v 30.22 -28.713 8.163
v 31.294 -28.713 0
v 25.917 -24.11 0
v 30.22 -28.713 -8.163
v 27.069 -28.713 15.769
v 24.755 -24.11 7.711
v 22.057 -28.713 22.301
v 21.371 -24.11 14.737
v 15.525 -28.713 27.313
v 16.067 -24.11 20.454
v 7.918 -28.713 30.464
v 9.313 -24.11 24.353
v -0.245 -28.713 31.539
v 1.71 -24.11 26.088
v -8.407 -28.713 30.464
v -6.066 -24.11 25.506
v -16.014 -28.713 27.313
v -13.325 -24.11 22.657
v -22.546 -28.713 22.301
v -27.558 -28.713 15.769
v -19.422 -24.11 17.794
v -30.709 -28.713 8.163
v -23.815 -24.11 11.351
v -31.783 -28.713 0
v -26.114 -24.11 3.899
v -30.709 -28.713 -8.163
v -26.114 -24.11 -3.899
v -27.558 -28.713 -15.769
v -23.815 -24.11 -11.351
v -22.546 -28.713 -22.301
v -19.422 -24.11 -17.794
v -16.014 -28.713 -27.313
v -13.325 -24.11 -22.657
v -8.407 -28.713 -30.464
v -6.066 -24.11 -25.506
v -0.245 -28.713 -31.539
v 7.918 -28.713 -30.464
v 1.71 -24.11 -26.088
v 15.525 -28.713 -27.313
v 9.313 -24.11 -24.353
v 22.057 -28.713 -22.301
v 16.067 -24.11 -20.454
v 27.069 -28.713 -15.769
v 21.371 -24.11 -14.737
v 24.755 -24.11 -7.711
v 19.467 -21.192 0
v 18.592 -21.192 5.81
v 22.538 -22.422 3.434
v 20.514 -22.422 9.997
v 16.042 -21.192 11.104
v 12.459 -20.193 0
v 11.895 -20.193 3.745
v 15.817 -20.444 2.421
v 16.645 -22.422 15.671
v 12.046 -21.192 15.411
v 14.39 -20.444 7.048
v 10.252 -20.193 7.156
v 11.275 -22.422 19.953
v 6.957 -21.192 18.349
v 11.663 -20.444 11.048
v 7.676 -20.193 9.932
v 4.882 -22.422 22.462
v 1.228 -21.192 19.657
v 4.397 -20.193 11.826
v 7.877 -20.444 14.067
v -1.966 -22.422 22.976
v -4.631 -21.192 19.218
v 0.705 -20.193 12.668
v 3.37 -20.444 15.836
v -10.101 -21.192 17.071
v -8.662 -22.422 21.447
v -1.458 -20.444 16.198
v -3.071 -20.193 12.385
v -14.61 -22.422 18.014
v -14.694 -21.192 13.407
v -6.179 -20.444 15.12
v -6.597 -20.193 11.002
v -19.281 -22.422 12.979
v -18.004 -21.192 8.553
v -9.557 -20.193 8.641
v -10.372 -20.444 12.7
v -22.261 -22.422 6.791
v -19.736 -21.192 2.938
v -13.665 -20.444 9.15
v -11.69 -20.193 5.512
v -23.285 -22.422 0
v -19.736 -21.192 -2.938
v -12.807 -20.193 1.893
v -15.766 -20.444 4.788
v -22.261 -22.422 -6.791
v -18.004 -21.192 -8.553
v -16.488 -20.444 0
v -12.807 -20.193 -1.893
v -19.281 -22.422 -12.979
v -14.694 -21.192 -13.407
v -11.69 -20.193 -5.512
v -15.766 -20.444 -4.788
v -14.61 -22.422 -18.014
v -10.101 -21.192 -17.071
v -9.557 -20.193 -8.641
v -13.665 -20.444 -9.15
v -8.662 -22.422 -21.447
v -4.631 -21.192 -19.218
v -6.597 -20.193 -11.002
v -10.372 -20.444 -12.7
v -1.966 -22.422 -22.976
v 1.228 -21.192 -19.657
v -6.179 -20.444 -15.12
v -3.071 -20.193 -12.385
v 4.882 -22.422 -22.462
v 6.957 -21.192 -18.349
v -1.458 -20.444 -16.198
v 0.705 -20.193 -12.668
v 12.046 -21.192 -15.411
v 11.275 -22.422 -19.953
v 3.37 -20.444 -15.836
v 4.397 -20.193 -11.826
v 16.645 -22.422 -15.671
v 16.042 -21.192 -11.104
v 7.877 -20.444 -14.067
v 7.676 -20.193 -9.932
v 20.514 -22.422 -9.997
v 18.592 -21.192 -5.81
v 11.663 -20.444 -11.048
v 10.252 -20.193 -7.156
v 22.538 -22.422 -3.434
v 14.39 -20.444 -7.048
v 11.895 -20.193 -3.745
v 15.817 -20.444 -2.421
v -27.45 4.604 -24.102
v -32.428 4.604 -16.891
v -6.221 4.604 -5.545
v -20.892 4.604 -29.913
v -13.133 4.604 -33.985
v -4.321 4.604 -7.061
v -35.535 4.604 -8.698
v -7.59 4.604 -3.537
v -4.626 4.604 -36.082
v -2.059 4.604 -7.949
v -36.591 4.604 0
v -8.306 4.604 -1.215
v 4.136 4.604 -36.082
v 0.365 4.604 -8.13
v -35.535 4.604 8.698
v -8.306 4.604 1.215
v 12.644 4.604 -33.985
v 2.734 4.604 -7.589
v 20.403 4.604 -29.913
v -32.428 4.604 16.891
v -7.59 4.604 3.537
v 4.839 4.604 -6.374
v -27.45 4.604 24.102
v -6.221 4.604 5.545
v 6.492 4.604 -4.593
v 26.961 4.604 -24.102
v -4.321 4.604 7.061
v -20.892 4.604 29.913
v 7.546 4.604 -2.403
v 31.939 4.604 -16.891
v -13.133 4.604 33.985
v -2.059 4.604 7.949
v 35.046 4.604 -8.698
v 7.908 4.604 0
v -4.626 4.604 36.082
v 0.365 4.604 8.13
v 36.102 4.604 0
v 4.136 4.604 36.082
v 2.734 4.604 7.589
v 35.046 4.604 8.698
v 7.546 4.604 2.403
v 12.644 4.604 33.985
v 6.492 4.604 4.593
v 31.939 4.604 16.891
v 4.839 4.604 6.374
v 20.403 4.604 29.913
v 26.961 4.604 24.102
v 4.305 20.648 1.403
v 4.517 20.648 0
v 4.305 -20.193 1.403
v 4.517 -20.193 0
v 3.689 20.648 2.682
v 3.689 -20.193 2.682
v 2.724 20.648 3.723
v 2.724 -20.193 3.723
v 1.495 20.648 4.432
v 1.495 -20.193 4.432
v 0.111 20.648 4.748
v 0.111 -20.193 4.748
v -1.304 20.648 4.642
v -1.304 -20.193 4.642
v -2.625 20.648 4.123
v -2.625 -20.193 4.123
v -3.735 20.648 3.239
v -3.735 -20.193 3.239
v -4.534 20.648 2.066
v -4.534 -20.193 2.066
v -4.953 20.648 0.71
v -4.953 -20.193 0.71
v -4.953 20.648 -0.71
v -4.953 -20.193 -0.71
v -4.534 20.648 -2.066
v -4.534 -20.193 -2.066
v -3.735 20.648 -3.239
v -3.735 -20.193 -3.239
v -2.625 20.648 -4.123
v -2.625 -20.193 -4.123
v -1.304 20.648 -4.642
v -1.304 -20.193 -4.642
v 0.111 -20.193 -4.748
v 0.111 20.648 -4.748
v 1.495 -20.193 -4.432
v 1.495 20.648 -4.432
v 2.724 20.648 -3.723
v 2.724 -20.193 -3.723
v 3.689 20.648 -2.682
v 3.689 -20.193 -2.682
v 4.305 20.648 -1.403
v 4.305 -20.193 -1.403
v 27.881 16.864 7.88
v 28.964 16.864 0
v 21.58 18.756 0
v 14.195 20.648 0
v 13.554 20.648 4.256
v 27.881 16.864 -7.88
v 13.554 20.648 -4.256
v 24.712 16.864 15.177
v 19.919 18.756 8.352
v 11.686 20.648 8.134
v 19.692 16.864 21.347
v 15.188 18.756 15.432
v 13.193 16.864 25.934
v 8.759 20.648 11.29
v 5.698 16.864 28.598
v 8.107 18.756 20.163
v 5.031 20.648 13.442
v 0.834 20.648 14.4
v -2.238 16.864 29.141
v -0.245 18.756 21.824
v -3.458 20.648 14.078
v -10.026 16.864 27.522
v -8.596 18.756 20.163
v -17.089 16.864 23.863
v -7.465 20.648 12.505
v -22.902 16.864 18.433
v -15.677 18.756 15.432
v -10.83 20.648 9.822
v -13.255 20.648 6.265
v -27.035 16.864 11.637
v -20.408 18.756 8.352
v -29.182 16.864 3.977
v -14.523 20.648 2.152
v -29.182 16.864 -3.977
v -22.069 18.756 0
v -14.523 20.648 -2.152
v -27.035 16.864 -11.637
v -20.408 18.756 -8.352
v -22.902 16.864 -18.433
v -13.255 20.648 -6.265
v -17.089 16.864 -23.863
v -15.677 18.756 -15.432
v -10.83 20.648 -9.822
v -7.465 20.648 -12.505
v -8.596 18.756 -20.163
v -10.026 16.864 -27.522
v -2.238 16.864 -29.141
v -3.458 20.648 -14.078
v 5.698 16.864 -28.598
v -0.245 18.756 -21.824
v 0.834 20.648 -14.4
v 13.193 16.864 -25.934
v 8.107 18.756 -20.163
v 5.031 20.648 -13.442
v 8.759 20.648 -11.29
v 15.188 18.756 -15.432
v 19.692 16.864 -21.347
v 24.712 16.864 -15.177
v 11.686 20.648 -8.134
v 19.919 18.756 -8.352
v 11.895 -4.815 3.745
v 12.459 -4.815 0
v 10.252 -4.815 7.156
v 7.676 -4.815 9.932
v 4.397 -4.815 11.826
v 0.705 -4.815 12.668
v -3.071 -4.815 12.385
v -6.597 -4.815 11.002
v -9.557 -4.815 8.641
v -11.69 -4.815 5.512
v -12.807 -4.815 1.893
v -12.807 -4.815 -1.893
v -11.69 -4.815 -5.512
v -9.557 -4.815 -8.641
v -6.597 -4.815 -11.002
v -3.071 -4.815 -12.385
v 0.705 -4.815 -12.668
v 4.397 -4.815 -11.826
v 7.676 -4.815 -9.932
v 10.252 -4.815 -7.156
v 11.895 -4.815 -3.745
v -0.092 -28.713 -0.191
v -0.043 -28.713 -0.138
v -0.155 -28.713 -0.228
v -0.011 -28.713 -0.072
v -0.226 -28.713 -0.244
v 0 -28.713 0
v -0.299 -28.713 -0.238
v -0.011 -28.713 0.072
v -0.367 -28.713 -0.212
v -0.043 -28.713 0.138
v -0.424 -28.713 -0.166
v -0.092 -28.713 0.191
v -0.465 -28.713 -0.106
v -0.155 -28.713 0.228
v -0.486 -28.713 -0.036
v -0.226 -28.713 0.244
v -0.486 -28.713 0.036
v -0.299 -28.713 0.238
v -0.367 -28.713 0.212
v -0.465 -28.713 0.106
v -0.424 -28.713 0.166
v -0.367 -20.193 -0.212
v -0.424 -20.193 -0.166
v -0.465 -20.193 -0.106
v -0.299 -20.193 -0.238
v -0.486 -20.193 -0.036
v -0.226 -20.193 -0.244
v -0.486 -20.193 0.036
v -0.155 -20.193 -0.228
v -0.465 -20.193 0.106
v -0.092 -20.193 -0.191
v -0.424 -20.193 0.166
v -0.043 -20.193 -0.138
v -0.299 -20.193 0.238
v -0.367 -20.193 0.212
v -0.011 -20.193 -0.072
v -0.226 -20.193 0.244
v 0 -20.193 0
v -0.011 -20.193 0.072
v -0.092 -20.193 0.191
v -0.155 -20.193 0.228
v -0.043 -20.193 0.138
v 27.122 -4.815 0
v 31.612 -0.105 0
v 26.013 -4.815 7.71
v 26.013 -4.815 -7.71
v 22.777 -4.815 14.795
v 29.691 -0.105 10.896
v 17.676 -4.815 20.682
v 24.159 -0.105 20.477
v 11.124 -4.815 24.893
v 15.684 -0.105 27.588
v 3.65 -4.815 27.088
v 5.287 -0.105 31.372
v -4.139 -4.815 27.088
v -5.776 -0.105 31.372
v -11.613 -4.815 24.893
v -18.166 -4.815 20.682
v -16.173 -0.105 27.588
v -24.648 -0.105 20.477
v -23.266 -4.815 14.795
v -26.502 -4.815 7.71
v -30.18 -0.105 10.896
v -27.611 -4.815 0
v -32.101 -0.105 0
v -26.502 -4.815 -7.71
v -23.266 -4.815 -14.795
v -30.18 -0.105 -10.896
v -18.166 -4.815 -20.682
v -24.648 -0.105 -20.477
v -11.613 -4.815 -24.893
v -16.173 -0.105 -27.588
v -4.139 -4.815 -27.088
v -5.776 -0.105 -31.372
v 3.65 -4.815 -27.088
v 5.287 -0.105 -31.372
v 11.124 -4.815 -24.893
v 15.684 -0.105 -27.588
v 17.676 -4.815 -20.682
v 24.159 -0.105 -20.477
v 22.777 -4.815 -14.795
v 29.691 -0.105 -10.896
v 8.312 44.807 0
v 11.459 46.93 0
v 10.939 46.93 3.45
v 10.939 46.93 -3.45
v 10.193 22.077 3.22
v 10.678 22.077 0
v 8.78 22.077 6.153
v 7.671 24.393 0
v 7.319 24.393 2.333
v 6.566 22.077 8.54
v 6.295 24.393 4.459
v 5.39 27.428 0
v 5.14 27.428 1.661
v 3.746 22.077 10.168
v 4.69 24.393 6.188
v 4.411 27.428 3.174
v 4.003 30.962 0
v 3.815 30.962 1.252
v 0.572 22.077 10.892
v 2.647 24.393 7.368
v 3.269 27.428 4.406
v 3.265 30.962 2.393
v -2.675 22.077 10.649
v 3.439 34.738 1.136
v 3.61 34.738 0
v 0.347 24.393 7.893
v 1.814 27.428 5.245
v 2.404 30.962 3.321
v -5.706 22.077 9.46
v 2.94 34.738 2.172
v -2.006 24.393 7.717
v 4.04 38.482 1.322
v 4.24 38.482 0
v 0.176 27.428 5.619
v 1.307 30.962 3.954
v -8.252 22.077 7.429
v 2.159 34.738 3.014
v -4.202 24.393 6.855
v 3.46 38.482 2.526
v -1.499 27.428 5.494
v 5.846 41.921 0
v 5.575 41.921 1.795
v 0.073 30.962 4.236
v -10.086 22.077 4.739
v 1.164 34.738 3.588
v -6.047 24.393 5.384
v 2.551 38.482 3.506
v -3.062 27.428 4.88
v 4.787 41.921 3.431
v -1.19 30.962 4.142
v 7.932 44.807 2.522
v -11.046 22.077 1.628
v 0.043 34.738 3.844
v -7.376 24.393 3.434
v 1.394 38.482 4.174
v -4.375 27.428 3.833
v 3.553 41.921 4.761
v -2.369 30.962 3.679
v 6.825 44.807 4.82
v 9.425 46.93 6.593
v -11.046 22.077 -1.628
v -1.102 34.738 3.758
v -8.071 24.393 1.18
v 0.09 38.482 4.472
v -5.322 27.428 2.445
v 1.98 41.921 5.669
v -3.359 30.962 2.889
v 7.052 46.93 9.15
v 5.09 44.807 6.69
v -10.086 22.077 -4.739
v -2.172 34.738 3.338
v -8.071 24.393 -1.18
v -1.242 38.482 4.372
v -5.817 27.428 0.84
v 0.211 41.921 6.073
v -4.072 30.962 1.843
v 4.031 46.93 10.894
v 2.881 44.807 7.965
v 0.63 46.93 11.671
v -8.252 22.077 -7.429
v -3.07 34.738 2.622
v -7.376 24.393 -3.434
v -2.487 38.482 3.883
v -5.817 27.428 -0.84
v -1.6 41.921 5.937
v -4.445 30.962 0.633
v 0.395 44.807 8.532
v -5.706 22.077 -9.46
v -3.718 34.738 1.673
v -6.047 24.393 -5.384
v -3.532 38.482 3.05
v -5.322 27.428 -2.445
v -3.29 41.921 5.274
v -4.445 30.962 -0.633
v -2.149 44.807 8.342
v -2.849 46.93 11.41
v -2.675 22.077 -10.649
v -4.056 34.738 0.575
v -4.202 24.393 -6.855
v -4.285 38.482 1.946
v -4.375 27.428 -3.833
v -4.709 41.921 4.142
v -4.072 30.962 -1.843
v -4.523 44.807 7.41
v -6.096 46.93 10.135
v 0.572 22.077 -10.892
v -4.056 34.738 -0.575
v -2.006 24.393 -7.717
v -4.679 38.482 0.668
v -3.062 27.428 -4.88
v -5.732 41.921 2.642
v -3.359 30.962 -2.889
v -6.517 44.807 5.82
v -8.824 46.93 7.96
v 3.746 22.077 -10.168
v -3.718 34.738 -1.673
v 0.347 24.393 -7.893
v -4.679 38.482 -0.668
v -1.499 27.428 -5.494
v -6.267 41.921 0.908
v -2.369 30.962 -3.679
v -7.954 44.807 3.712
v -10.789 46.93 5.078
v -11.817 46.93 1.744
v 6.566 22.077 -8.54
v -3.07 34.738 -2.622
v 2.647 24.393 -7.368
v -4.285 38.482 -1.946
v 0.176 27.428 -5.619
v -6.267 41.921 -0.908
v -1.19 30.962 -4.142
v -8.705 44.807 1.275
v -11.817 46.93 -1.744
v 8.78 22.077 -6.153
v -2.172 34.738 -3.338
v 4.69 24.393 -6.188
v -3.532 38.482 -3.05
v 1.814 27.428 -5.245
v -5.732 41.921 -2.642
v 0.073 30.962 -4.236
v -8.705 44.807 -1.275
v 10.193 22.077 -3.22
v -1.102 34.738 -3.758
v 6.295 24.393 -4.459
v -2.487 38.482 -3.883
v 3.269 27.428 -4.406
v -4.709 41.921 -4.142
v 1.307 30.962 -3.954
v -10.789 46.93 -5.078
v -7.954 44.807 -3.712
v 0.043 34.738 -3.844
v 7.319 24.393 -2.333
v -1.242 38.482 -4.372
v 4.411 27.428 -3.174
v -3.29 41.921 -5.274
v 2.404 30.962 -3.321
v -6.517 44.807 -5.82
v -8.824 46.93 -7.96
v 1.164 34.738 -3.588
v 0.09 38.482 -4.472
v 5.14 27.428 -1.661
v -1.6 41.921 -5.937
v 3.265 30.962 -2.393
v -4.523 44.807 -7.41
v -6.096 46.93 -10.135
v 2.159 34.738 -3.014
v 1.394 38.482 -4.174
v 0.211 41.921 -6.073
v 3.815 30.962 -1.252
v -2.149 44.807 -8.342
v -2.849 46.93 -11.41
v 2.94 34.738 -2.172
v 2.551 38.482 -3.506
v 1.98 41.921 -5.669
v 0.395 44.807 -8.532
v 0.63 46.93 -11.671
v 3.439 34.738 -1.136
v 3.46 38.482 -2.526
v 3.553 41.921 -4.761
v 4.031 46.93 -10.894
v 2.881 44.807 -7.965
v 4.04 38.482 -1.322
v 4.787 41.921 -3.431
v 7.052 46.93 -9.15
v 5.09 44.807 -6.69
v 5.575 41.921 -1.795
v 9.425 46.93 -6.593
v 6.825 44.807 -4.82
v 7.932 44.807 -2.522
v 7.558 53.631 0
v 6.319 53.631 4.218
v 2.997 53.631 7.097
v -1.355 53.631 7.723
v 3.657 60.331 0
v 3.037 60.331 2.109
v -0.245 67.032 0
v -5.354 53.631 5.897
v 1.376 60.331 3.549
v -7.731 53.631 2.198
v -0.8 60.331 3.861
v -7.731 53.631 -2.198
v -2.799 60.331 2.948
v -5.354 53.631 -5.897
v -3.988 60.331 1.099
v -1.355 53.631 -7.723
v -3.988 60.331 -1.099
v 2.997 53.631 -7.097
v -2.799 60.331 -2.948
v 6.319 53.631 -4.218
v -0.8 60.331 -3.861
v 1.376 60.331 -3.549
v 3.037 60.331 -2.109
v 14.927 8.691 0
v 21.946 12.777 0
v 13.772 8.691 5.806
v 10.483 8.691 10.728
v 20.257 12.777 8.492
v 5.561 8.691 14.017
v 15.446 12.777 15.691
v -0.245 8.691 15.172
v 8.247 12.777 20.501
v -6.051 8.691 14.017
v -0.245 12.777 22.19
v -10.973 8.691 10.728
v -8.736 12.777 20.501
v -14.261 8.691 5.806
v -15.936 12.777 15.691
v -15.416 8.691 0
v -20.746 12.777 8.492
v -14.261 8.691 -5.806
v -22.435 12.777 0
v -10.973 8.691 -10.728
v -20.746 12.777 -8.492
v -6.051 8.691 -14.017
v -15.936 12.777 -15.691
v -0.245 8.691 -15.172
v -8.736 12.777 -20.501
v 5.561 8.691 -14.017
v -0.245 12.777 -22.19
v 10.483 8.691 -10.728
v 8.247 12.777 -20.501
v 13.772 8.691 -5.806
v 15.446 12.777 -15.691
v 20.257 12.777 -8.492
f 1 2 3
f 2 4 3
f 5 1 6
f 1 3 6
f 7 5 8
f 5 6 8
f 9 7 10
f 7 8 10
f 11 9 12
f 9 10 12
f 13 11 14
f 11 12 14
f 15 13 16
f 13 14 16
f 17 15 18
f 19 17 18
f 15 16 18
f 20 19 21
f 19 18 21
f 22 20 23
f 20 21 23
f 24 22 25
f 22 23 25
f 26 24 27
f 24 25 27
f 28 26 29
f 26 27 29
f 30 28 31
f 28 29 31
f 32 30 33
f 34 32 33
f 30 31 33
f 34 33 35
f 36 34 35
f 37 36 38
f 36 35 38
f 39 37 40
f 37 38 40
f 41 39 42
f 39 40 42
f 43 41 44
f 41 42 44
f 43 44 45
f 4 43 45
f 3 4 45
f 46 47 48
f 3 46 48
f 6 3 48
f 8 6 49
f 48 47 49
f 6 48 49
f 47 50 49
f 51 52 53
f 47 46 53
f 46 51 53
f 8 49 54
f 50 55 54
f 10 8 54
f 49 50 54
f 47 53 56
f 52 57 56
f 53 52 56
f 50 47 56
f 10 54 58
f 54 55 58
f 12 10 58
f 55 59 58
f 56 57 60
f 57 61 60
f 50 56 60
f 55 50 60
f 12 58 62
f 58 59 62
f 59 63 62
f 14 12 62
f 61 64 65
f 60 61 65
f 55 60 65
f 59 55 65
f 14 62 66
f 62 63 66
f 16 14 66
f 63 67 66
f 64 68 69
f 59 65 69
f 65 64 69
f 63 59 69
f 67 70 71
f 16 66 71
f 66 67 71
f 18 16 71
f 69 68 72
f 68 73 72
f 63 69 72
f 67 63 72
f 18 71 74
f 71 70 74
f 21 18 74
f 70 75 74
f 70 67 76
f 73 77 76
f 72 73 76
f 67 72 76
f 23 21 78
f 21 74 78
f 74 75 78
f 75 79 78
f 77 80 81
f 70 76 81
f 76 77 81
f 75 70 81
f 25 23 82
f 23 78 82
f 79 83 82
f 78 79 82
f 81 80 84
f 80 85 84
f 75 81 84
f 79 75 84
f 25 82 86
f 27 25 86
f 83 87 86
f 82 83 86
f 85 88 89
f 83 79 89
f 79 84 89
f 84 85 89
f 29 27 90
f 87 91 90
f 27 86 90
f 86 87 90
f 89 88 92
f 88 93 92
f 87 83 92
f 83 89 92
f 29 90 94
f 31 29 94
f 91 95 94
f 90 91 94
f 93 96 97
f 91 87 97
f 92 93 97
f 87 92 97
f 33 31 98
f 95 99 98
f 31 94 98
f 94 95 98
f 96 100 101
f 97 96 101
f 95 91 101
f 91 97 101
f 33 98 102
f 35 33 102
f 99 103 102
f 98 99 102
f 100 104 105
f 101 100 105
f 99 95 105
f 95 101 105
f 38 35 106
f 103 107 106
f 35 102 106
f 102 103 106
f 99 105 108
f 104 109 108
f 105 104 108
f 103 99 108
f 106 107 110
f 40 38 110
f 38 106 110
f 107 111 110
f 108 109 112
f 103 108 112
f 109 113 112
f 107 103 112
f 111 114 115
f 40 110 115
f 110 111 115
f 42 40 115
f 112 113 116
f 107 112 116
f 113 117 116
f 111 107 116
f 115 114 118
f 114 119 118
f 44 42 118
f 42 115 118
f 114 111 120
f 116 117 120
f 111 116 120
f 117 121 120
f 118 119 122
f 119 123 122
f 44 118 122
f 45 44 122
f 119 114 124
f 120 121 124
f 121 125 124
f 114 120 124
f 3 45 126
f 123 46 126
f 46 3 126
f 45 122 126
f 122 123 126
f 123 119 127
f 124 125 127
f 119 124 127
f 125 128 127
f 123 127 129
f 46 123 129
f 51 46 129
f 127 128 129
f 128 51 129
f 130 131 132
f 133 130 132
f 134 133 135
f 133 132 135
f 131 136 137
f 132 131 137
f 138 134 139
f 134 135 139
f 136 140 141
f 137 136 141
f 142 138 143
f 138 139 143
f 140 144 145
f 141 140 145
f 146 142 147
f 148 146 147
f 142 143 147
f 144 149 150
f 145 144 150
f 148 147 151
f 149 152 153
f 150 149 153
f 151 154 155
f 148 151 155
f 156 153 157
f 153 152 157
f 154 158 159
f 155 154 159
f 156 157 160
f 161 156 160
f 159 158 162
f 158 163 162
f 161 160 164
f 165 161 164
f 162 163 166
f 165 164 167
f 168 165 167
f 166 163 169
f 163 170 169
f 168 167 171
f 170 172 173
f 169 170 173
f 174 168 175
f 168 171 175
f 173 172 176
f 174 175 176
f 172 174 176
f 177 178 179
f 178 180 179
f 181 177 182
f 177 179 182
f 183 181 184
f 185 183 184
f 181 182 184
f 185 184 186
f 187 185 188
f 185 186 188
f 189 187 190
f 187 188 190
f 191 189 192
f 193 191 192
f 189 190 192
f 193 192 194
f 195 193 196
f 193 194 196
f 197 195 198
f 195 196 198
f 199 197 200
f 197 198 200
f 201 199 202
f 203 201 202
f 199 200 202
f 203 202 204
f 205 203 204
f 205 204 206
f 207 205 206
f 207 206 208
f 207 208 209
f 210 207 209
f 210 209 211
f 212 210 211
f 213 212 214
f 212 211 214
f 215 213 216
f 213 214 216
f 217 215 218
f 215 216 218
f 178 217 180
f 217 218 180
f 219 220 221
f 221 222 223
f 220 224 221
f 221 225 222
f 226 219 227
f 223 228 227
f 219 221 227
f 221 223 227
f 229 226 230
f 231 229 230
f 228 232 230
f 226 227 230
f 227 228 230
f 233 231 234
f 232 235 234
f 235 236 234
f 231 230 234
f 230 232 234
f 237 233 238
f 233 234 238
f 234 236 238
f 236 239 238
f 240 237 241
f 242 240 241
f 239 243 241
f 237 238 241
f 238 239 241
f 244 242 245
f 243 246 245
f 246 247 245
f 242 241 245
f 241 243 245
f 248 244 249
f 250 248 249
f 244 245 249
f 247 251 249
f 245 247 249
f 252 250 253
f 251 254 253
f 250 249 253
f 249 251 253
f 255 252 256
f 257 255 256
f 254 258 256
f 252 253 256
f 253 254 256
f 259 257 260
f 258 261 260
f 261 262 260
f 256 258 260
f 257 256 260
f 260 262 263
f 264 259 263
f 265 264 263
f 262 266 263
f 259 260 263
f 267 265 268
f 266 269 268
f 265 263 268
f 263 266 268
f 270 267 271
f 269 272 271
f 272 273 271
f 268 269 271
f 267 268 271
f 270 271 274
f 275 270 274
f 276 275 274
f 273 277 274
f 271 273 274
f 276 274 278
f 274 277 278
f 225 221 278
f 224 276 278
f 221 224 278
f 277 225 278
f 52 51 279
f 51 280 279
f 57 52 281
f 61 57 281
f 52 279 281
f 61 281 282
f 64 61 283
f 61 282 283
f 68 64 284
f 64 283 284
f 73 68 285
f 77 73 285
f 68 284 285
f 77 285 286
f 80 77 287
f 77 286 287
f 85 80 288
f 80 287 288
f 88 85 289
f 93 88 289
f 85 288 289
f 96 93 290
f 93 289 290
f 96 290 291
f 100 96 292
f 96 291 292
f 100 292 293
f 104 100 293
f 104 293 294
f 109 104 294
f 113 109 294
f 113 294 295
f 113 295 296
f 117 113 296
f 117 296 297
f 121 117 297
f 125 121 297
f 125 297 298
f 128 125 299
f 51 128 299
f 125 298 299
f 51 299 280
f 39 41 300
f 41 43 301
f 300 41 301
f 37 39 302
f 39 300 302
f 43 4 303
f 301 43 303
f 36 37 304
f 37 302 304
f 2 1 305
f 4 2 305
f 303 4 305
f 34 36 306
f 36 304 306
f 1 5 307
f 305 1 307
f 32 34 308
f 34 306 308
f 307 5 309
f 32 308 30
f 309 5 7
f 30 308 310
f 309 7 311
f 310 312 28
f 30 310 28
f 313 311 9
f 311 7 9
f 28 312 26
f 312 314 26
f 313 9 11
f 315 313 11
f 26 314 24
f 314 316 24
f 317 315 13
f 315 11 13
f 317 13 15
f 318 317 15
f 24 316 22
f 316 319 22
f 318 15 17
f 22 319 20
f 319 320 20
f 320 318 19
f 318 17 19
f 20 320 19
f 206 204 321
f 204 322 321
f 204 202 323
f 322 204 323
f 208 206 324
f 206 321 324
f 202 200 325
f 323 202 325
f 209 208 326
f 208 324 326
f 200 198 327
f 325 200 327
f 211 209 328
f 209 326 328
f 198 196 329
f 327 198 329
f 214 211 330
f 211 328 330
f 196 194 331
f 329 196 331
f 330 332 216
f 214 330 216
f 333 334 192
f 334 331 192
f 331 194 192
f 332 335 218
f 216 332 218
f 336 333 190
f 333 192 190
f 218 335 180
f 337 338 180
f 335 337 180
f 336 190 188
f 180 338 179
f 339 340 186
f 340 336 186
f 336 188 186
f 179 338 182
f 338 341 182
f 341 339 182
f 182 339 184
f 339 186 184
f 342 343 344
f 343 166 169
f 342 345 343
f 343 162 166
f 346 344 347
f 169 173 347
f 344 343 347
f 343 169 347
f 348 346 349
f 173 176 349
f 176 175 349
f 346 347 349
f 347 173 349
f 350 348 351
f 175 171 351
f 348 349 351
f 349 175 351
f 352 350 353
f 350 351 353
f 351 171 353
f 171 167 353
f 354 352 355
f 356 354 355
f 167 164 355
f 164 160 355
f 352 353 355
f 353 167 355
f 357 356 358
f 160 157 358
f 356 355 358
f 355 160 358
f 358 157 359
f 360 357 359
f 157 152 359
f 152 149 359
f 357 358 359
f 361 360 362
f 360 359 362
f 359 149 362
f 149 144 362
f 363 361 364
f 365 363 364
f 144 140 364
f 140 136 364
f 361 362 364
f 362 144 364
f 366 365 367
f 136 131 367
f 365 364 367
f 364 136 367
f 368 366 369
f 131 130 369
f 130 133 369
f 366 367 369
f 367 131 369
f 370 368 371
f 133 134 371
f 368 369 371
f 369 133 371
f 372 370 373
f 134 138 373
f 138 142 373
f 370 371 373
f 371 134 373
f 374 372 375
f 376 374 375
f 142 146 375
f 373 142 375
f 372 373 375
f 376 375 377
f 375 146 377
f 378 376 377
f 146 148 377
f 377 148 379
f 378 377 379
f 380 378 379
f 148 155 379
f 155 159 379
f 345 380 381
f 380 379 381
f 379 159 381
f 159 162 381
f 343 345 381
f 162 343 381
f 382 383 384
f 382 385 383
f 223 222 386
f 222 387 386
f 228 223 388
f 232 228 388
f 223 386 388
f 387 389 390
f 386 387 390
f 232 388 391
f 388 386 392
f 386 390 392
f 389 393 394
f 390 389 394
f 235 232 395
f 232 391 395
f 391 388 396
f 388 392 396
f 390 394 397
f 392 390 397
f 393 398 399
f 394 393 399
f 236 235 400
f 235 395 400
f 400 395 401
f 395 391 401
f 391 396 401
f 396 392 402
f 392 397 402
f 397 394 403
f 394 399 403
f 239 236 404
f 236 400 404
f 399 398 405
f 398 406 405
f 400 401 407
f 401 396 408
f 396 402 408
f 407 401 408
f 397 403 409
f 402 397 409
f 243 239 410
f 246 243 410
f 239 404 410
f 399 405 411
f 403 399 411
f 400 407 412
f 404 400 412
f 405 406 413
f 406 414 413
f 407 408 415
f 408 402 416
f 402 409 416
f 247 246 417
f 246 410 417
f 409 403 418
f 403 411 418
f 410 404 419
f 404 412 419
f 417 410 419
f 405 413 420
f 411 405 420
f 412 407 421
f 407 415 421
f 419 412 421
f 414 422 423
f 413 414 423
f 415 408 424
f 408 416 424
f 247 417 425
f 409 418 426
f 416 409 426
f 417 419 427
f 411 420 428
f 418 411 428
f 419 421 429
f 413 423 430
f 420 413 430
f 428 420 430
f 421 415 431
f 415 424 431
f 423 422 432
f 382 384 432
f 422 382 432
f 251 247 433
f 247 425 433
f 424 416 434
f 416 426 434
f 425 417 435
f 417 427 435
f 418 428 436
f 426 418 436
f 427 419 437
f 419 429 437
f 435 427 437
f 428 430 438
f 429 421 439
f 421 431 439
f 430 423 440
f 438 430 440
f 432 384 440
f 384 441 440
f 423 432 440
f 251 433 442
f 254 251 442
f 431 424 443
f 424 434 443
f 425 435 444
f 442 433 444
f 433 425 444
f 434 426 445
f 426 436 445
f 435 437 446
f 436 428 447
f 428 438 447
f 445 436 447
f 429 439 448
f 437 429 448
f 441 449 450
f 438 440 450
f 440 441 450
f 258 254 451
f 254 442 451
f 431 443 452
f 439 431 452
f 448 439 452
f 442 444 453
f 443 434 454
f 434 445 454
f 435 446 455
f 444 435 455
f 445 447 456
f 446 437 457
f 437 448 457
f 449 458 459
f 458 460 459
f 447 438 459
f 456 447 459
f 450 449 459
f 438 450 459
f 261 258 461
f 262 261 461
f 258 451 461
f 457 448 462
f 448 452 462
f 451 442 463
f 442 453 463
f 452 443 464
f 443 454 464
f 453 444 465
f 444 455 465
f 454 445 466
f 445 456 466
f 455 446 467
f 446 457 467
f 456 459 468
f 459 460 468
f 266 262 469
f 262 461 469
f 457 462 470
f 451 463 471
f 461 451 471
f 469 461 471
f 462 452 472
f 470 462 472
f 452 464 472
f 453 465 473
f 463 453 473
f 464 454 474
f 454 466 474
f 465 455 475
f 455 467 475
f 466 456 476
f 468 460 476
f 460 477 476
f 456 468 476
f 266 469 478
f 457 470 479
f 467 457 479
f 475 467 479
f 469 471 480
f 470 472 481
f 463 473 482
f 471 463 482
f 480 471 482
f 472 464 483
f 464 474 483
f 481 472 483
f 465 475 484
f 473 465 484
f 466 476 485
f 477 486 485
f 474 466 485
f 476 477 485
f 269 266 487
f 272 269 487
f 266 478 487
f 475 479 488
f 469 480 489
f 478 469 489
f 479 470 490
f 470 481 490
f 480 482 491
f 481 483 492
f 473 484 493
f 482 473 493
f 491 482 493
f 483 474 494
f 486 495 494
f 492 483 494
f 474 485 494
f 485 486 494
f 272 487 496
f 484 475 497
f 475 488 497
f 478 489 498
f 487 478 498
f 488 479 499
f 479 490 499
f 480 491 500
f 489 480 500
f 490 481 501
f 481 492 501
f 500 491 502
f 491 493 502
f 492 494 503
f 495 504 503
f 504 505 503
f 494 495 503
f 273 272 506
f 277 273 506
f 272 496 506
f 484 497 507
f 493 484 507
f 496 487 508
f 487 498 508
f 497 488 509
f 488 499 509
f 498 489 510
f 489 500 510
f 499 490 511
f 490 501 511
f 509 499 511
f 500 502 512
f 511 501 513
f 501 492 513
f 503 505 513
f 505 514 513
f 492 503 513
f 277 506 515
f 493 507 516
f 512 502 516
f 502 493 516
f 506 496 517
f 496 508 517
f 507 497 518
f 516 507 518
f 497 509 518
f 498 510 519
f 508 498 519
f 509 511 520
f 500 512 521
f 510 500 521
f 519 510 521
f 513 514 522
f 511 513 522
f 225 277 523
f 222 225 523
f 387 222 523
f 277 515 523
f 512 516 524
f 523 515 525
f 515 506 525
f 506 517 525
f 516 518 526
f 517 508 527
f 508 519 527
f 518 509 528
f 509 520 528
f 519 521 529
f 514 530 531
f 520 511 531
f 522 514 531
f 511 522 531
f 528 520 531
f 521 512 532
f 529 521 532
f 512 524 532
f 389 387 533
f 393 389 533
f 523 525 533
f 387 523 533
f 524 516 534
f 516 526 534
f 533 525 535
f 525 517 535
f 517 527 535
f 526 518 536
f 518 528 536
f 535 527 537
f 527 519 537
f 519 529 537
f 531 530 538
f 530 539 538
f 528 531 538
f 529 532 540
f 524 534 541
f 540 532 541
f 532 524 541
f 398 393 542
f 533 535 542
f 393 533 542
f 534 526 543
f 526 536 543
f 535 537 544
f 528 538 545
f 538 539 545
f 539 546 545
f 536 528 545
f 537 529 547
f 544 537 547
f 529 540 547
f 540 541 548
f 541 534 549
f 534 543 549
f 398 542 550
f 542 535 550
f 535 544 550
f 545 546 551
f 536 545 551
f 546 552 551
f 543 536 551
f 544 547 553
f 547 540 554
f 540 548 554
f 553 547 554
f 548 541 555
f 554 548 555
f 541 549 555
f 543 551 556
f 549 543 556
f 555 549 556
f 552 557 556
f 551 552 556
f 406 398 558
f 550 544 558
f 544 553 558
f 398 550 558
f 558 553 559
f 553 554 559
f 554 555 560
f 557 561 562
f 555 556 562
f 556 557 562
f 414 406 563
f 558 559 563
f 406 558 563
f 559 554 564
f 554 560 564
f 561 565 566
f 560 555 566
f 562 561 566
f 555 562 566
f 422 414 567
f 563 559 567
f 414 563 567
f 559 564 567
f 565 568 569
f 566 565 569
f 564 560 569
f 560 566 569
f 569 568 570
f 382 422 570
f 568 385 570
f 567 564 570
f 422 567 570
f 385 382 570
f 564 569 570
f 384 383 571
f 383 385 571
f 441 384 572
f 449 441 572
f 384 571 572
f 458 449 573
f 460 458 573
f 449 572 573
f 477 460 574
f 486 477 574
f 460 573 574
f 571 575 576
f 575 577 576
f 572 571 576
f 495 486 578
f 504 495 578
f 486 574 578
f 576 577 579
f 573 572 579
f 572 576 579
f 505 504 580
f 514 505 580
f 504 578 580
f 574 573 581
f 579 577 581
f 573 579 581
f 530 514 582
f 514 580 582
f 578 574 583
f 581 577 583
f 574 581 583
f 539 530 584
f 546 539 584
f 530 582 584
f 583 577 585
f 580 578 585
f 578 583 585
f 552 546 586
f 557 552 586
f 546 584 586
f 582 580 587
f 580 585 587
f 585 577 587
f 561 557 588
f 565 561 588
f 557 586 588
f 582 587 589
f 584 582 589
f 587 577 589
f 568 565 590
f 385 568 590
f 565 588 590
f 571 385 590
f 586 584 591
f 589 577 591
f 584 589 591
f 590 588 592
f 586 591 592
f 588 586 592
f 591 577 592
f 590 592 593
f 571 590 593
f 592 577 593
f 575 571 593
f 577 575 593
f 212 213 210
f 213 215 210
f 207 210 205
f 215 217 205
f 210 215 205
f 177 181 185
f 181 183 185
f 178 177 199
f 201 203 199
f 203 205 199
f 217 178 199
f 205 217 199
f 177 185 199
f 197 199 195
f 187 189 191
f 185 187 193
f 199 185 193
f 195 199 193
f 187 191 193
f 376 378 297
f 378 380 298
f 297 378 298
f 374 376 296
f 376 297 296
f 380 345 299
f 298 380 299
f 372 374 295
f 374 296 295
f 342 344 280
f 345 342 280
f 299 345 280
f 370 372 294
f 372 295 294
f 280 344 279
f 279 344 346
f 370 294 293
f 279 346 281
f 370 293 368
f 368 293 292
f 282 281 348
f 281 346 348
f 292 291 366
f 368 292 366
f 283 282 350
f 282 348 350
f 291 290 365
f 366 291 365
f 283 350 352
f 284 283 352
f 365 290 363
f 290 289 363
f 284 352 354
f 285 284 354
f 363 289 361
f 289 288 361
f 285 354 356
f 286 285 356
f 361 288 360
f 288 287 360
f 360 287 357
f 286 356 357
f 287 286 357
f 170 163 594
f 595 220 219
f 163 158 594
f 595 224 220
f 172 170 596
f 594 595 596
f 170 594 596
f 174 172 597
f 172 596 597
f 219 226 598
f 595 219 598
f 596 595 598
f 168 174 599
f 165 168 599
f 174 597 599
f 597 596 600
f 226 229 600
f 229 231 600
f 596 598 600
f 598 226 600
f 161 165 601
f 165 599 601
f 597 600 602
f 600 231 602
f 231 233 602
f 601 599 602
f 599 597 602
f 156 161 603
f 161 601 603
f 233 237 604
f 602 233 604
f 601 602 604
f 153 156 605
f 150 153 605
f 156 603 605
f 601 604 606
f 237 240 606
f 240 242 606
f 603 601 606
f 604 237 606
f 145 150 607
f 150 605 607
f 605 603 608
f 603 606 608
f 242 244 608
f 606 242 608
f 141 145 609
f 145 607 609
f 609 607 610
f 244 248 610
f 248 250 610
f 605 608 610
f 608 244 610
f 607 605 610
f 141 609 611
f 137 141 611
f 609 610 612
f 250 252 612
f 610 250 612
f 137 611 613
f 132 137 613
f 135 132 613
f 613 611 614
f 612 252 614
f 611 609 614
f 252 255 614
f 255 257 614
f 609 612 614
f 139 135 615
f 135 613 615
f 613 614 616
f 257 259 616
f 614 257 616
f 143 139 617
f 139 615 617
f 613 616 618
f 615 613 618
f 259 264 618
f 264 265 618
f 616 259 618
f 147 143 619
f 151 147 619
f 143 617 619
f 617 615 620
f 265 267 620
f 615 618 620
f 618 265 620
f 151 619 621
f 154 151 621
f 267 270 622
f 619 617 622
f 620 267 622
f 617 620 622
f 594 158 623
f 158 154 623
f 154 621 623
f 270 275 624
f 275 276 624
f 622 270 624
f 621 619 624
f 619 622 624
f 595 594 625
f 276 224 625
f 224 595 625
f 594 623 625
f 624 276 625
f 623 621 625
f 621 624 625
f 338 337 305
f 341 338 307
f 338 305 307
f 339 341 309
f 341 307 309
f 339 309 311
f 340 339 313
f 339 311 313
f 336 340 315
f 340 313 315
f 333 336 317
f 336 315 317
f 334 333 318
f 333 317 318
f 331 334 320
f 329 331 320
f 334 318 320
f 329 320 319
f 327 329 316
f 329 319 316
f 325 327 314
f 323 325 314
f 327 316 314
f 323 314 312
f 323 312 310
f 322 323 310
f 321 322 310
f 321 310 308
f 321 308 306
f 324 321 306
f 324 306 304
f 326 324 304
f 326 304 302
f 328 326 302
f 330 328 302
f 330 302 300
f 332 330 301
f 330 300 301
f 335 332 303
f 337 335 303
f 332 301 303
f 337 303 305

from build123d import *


with BuildPart() as f1:
    # F0 (on Top) → F1 (revolve)
    with BuildSketch(Plane.XY):
        with BuildLine():
            Line((11.458813, 46.930371), (-0.244609, 67.031535))
            Line((-0.244609, 67.031535), (-0.244609, 20.647742))
            Line((-0.244609, 20.647742), (4.516693, 20.647742))
            Line((4.516693, 20.647742), (4.516693, -20.192879))
            Line((4.516693, -20.192879), (12.459272, -20.192879))
            Line((12.459272, -20.192879), (12.459272, -4.814634))
            Line((12.459272, -4.814634), (27.12154, -4.814634))
            Line((27.12154, -4.814634), (36.102078, 4.604435))
            Line((36.102078, 4.604435), (7.908328, 4.604435))
            Line((7.908328, 4.604435), (28.964354, 16.863803))
            Line((28.964354, 16.863803), (14.195322, 20.647742))
            ThreePointArc((14.195322, 20.647742), (3.67909, 32.836583), (11.458813, 46.930371))
        make_face()
        with BuildLine():
            Line((12.459272, -20.192879), (4.516693, -20.192879))
            Line((4.516693, -20.192879), (0, -20.192879))
            Line((0, -20.192879), (0, -28.713265))
            Line((0, -28.713265), (31.294234, -28.713265))
            ThreePointArc((31.294234, -28.713265), (22.795528, -22.422049), (12.459272, -20.192879))
        make_face()
    revolve(axis=Axis((-0.244609, 43.839638, 0), (0, -1, 0)))


solid = f1.part
